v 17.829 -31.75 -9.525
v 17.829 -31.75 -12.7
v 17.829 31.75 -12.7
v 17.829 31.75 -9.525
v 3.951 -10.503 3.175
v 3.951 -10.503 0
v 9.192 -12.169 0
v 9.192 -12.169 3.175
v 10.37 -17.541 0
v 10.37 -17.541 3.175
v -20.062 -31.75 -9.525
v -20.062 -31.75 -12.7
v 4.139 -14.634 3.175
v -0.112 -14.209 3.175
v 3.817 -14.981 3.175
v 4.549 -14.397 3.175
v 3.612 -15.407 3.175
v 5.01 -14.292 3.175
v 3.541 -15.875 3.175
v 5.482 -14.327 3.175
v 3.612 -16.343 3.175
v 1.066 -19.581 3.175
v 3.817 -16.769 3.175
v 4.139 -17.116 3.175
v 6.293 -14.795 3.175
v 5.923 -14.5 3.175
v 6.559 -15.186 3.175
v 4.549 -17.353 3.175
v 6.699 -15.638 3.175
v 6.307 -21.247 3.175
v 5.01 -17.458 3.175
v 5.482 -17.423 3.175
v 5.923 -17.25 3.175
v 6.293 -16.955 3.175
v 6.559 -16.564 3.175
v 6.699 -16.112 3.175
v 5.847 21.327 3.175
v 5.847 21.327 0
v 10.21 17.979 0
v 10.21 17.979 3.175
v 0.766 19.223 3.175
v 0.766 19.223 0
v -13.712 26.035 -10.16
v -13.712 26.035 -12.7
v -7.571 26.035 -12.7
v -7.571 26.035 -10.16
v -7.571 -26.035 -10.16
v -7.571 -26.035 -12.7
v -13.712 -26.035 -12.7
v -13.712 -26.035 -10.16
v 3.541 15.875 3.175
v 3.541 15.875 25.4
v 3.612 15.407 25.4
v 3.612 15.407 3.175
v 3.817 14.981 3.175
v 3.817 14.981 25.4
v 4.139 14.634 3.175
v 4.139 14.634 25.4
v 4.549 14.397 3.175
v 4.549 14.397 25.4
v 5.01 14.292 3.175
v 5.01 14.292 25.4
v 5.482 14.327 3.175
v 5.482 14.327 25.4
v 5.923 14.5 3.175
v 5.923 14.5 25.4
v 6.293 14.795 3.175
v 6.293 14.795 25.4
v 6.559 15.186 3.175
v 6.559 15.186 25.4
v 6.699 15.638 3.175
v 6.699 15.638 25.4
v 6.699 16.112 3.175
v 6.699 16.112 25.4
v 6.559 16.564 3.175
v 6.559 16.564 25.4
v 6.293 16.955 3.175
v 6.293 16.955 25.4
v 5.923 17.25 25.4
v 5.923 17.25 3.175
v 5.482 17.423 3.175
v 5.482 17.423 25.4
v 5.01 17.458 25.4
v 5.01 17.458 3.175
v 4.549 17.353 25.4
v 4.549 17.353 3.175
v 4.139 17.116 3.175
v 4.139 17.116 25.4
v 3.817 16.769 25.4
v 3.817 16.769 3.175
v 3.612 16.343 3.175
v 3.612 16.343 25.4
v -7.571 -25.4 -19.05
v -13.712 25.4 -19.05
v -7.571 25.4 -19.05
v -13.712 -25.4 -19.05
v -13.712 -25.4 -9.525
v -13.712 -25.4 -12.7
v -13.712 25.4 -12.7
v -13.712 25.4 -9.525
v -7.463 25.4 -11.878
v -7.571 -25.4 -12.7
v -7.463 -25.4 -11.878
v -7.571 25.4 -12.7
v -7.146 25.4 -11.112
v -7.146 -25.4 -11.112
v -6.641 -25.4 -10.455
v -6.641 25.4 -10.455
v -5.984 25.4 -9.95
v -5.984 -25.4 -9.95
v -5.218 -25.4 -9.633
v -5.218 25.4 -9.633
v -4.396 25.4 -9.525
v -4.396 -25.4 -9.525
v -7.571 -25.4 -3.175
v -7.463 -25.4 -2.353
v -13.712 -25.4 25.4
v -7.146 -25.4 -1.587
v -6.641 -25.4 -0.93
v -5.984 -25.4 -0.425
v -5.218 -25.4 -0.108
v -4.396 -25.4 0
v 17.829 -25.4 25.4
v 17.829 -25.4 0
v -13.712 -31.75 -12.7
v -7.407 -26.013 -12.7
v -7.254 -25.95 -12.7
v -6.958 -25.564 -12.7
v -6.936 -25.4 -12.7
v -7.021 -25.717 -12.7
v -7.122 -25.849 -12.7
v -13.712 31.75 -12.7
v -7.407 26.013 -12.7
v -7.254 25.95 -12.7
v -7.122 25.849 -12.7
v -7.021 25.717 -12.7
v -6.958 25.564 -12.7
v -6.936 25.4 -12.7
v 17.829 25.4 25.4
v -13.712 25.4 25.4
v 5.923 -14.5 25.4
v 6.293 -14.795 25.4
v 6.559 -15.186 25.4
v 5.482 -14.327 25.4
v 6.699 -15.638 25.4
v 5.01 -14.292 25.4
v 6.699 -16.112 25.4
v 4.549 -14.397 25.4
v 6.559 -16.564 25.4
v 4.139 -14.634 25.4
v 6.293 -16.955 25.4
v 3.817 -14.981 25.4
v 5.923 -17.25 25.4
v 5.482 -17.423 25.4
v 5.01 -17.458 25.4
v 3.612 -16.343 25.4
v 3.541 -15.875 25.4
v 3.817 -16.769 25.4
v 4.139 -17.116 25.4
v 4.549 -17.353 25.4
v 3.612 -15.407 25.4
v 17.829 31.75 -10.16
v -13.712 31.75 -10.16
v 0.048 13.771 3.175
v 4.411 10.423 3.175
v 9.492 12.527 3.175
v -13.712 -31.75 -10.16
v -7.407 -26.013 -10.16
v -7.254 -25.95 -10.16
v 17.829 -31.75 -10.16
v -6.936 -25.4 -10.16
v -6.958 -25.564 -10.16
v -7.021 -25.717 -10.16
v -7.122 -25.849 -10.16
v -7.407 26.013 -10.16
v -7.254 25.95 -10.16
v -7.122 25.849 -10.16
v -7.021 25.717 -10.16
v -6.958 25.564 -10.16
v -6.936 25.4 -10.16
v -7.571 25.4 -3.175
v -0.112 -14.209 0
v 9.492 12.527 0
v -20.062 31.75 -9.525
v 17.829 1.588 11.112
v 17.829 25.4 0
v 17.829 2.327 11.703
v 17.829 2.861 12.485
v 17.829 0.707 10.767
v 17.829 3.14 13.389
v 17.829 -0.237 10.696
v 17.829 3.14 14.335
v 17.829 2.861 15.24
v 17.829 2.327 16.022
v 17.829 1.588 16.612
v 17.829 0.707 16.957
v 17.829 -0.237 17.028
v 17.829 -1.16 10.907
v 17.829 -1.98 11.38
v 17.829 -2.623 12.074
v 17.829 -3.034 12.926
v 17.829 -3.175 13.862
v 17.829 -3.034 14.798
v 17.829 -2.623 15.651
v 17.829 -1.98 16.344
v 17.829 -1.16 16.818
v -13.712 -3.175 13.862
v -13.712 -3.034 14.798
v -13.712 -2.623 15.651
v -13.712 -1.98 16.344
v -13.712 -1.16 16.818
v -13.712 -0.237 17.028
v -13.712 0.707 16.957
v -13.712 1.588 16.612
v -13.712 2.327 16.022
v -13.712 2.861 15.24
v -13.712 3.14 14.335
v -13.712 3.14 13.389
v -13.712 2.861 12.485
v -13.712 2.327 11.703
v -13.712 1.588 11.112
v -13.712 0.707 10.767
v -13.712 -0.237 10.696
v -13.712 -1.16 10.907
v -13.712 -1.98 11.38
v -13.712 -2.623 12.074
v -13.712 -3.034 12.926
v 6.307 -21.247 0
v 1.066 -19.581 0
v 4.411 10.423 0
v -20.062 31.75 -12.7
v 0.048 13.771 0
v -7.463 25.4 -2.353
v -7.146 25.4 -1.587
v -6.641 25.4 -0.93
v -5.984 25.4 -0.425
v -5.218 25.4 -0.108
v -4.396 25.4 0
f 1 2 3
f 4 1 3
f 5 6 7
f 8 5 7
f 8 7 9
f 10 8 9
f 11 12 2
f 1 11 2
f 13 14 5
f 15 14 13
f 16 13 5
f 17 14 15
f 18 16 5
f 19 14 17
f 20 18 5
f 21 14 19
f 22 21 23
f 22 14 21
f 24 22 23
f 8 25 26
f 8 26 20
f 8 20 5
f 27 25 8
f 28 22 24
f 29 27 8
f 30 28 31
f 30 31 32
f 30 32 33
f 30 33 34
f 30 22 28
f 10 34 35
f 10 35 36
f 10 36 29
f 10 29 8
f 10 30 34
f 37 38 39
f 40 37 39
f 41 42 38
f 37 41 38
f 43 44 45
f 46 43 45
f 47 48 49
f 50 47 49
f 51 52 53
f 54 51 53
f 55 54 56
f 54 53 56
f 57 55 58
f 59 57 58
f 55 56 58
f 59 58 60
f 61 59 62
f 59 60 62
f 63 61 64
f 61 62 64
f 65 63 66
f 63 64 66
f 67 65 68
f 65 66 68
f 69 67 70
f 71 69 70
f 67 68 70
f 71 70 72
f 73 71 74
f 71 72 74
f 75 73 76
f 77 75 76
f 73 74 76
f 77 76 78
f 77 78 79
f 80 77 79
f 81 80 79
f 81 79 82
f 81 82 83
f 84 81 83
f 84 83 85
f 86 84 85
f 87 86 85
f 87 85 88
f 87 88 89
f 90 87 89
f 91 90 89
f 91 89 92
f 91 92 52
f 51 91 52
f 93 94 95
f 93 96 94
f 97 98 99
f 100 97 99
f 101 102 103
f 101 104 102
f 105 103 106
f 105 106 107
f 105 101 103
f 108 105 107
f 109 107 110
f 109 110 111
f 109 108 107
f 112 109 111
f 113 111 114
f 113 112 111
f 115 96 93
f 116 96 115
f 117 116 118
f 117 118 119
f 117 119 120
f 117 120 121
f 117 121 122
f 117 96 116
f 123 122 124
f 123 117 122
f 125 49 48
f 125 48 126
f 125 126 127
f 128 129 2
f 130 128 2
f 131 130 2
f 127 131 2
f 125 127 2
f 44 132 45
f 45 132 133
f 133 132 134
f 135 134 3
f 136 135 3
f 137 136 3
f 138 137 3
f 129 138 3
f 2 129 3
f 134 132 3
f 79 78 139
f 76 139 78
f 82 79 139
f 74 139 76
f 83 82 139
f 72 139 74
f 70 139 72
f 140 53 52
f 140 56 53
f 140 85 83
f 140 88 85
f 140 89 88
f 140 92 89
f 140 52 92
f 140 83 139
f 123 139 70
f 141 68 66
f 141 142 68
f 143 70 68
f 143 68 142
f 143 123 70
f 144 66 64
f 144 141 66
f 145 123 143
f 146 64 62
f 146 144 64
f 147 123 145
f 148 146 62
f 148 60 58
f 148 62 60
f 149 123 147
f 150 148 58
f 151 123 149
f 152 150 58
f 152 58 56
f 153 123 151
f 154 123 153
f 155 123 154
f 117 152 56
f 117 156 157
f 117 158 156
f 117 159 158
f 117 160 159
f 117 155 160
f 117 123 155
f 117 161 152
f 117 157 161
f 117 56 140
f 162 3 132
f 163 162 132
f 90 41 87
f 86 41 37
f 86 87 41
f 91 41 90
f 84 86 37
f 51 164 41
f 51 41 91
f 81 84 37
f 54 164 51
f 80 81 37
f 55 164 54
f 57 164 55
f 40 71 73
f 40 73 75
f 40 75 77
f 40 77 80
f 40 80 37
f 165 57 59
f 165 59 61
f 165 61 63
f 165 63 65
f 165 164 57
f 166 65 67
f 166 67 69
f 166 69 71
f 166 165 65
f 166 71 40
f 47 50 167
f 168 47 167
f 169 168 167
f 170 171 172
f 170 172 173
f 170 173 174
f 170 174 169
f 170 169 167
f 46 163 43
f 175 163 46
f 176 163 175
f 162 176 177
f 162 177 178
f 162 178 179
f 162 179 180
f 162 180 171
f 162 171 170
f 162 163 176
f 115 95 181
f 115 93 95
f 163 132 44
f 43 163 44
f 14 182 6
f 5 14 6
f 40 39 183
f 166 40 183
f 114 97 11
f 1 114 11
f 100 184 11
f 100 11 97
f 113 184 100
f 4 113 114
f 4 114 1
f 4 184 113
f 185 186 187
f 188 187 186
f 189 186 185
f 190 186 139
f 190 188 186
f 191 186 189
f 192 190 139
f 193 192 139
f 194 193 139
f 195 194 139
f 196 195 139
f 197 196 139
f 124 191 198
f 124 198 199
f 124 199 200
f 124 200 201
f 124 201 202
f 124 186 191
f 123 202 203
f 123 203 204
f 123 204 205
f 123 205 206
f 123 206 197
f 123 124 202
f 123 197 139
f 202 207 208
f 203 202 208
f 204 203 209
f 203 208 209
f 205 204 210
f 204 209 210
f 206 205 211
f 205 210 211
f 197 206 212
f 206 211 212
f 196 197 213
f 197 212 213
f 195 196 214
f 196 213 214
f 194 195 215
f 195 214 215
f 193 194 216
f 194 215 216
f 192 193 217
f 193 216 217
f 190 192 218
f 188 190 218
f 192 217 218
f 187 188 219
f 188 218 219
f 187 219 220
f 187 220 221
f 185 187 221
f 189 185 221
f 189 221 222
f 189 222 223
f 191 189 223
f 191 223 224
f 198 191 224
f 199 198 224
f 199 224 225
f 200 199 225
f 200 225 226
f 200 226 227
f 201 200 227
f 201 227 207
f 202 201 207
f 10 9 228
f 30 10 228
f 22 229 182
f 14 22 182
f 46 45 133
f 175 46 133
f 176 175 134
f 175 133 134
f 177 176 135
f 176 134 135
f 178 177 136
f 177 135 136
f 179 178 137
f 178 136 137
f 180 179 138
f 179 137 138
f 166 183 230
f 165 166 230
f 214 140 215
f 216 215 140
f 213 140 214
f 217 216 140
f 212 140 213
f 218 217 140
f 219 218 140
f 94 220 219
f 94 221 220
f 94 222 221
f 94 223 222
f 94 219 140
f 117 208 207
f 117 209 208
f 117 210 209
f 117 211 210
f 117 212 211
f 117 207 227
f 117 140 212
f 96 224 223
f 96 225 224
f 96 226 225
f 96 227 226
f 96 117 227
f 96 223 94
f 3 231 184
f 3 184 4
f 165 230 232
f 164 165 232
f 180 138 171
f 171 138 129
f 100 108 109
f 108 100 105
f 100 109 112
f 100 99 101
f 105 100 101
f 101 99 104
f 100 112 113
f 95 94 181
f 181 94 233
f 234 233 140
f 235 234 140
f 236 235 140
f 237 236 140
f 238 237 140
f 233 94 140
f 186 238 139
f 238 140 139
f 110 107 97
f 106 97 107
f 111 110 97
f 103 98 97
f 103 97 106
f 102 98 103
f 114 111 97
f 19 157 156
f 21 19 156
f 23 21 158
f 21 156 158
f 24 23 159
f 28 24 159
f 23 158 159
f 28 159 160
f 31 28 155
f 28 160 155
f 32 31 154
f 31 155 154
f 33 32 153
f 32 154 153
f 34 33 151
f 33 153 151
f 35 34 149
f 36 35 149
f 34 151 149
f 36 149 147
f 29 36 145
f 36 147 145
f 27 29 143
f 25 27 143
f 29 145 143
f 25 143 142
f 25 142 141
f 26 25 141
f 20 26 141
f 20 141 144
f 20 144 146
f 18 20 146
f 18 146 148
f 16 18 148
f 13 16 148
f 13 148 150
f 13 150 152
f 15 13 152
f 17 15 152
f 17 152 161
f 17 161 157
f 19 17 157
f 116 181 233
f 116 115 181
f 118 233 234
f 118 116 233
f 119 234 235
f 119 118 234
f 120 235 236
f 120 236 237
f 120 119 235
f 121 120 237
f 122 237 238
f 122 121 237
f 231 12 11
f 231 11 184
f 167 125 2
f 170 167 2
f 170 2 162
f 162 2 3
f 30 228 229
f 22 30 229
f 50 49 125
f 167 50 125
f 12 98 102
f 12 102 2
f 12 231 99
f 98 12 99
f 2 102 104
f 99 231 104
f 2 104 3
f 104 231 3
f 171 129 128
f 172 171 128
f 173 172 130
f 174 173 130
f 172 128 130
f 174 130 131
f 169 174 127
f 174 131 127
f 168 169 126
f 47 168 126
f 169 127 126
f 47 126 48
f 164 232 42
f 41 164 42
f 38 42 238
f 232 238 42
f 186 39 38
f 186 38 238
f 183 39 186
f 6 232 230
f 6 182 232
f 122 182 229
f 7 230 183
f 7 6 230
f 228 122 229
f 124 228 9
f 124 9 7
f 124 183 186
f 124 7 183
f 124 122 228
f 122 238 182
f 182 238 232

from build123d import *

# Parameters (mm, degrees)
F1_DEPTH  = 25.4
F3_D      = 6.35
F6_DEPTH  = 3.175
F7_D      = 3.175
F10_DEPTH = 2.54
F11_W     = 37.8906604153
F11_H     = 63.5
F11_W_2   = 6.1406604153
F11_H_2   = 50.8
F12_DEPTH = 3.175
F13_R     = 3.17499


# Not quite as in the source:
# - a fillet or chamfer is up to 0.001 mm smaller than in the source, because OpenCascade refuses the exact size


with BuildPart() as f1:
    # F0 (on Front) → F1 (new body, symmetric)
    with BuildSketch(Plane.XZ):
        with BuildLine():
            ThreePointArc((-7.5711545896, -3.175), (-6.6412186199, -0.9299359697), (-4.3961545896, 0))
            Line((-4.3961545896, 0), (17.8288454104, 0))
            Line((17.8288454104, 0), (17.8288454104, 25.4))
            Line((17.8288454104, 25.4), (-13.7118150049, 25.4))
            Line((-13.7118150049, 25.4), (-13.7118150049, -19.05))
            Line((-13.7118150049, -19.05), (-7.5711545896, -19.05))
            Line((-7.5711545896, -19.05), (-7.5711545896, -3.175))
        make_face()
    extrude(amount=F1_DEPTH, both=True)

    # F3 (through all)
    with Locations(Plane.YZ.offset(17.8288454104)):
        with Locations((0, 13.8620808721)):
            Hole(F3_D / 2)

    # F5 (on face) → F6 (cut)
    with BuildSketch(Plane(origin=(0, 0, 0), x_dir=(1, 0, 0), z_dir=(0, 0, -1))):
        Polygon((3.950722829, 10.5034171622), (9.1917113157, 12.1689244969), (10.3698338971, 17.5405073346), (6.3069679918, 21.2465828378), (1.065979505, 19.5810755031), (-0.1121430764, 14.2094926654), align=None)
        Polygon((0.7661597851, -19.2229619375), (5.8469226865, -21.327177549), (10.2096083118, -17.9792156115), (9.4915310357, -12.5270380625), (4.4107681342, -10.422822451), (0.048082509, -13.7707843885), align=None)
    extrude(amount=-F6_DEPTH, mode=Mode.SUBTRACT)

    # F7 (through all)
    with Locations(Plane(origin=(0, 0, 0), x_dir=(1, 0, 0), z_dir=(0, 0, -1))):
        with Locations((5.1288454104, -15.875), (5.1288454104, 15.875)):
            Hole(F7_D / 2)


with BuildPart() as f10:
    # F9 (on offset) → F10 (new body)
    with BuildSketch(Plane.XY.offset(-12.7)):
        with BuildLine():
            Line((17.8288454104, -31.75), (17.8288454104, 31.75))
            Line((17.8288454104, 31.75), (-13.7118150049, 31.75))
            Line((-13.7118150049, 31.75), (-13.7118150049, 26.035))
            Line((-13.7118150049, 26.035), (-7.5711545896, 26.035))
            ThreePointArc((-7.5711545896, 26.035), (-7.1221417836, 25.8490128061), (-6.9361545896, 25.4))
            Line((-6.9361545896, 25.4), (-6.9361545896, -25.4))
            ThreePointArc((-6.9361545896, -25.4), (-7.1221417836, -25.8490128061), (-7.5711545896, -26.035))
            Line((-7.5711545896, -26.035), (-13.7118150049, -26.035))
            Line((-13.7118150049, -26.035), (-13.7118150049, -31.75))
            Line((-13.7118150049, -31.75), (17.8288454104, -31.75))
        make_face()
    extrude(amount=F10_DEPTH)


with BuildPart() as f12:
    # F11 (on offset) → F12 (new body)
    with BuildSketch(Plane.XY.offset(-12.7)):
        with Locations((-1.1164847973, 0)):
            Rectangle(F11_W, F11_H)
        with Locations((-10.6414847973, 0)):
            Rectangle(F11_W_2, F11_H_2, mode=Mode.SUBTRACT)
    extrude(amount=F12_DEPTH)

    # F13 (radius 3.175 in the source; OpenCascade refuses exactly that, so slightly less here)
    f13_edges = [f12.edges().sort_by_distance(p)[0] for p in [
        (-7.571155, 0, -9.525),
    ]]
    fillet(f13_edges, radius=F13_R)


solid = Compound([f1.part, f10.part, f12.part])
